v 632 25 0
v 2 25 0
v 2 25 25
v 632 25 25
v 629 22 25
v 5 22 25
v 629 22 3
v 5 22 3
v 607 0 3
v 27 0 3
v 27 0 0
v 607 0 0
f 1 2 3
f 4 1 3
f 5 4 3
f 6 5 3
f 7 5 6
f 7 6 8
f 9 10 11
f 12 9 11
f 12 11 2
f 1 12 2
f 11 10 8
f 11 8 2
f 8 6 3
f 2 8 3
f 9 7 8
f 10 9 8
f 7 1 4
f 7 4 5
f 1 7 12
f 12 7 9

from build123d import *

# Parameters (mm, degrees)
F1_DEPTH    = 634
F2_T1_DEPTH = 47.7168298797
F4_DEPTH    = 25


# Not quite as in the source:
# - a fillet or chamfer that OpenCascade refuses, or shapes differently, is made with other operations: its cross-section is extruded or revolved along the edge and cut away or added


with BuildPart() as f1:
    # F0 (on Right) → F1 (new body)
    with BuildSketch(Plane.YZ):
        Polygon((0, 3), (0, 0), (25, 0), (25, 25), (22, 25), (22, 3), align=None)
    extrude(amount=F1_DEPTH)

    # F2: chamfer of 5 on 2 edges, made by hand

    # F2_s2 → F2_t1 (cut)
    with BuildSketch(Plane.XY.offset(-9.8584149398)):
        Polygon((629, 22), (634, 27), (634, 22), align=None)
        Polygon((5, 22), (0, 27), (0, 22), align=None)
    extrude(amount=F2_T1_DEPTH, mode=Mode.SUBTRACT)

    # F3 (on face) → F4 (cut)
    with BuildSketch(Plane.XY.offset(3)):
        Polygon((634, 22), (629, 22), (607, 0), (634, 0), align=None)
        Polygon((27, 0), (5, 22), (0, 22), (0, 0), align=None)
    extrude(amount=-F4_DEPTH, mode=Mode.SUBTRACT)


solid = f1.part
